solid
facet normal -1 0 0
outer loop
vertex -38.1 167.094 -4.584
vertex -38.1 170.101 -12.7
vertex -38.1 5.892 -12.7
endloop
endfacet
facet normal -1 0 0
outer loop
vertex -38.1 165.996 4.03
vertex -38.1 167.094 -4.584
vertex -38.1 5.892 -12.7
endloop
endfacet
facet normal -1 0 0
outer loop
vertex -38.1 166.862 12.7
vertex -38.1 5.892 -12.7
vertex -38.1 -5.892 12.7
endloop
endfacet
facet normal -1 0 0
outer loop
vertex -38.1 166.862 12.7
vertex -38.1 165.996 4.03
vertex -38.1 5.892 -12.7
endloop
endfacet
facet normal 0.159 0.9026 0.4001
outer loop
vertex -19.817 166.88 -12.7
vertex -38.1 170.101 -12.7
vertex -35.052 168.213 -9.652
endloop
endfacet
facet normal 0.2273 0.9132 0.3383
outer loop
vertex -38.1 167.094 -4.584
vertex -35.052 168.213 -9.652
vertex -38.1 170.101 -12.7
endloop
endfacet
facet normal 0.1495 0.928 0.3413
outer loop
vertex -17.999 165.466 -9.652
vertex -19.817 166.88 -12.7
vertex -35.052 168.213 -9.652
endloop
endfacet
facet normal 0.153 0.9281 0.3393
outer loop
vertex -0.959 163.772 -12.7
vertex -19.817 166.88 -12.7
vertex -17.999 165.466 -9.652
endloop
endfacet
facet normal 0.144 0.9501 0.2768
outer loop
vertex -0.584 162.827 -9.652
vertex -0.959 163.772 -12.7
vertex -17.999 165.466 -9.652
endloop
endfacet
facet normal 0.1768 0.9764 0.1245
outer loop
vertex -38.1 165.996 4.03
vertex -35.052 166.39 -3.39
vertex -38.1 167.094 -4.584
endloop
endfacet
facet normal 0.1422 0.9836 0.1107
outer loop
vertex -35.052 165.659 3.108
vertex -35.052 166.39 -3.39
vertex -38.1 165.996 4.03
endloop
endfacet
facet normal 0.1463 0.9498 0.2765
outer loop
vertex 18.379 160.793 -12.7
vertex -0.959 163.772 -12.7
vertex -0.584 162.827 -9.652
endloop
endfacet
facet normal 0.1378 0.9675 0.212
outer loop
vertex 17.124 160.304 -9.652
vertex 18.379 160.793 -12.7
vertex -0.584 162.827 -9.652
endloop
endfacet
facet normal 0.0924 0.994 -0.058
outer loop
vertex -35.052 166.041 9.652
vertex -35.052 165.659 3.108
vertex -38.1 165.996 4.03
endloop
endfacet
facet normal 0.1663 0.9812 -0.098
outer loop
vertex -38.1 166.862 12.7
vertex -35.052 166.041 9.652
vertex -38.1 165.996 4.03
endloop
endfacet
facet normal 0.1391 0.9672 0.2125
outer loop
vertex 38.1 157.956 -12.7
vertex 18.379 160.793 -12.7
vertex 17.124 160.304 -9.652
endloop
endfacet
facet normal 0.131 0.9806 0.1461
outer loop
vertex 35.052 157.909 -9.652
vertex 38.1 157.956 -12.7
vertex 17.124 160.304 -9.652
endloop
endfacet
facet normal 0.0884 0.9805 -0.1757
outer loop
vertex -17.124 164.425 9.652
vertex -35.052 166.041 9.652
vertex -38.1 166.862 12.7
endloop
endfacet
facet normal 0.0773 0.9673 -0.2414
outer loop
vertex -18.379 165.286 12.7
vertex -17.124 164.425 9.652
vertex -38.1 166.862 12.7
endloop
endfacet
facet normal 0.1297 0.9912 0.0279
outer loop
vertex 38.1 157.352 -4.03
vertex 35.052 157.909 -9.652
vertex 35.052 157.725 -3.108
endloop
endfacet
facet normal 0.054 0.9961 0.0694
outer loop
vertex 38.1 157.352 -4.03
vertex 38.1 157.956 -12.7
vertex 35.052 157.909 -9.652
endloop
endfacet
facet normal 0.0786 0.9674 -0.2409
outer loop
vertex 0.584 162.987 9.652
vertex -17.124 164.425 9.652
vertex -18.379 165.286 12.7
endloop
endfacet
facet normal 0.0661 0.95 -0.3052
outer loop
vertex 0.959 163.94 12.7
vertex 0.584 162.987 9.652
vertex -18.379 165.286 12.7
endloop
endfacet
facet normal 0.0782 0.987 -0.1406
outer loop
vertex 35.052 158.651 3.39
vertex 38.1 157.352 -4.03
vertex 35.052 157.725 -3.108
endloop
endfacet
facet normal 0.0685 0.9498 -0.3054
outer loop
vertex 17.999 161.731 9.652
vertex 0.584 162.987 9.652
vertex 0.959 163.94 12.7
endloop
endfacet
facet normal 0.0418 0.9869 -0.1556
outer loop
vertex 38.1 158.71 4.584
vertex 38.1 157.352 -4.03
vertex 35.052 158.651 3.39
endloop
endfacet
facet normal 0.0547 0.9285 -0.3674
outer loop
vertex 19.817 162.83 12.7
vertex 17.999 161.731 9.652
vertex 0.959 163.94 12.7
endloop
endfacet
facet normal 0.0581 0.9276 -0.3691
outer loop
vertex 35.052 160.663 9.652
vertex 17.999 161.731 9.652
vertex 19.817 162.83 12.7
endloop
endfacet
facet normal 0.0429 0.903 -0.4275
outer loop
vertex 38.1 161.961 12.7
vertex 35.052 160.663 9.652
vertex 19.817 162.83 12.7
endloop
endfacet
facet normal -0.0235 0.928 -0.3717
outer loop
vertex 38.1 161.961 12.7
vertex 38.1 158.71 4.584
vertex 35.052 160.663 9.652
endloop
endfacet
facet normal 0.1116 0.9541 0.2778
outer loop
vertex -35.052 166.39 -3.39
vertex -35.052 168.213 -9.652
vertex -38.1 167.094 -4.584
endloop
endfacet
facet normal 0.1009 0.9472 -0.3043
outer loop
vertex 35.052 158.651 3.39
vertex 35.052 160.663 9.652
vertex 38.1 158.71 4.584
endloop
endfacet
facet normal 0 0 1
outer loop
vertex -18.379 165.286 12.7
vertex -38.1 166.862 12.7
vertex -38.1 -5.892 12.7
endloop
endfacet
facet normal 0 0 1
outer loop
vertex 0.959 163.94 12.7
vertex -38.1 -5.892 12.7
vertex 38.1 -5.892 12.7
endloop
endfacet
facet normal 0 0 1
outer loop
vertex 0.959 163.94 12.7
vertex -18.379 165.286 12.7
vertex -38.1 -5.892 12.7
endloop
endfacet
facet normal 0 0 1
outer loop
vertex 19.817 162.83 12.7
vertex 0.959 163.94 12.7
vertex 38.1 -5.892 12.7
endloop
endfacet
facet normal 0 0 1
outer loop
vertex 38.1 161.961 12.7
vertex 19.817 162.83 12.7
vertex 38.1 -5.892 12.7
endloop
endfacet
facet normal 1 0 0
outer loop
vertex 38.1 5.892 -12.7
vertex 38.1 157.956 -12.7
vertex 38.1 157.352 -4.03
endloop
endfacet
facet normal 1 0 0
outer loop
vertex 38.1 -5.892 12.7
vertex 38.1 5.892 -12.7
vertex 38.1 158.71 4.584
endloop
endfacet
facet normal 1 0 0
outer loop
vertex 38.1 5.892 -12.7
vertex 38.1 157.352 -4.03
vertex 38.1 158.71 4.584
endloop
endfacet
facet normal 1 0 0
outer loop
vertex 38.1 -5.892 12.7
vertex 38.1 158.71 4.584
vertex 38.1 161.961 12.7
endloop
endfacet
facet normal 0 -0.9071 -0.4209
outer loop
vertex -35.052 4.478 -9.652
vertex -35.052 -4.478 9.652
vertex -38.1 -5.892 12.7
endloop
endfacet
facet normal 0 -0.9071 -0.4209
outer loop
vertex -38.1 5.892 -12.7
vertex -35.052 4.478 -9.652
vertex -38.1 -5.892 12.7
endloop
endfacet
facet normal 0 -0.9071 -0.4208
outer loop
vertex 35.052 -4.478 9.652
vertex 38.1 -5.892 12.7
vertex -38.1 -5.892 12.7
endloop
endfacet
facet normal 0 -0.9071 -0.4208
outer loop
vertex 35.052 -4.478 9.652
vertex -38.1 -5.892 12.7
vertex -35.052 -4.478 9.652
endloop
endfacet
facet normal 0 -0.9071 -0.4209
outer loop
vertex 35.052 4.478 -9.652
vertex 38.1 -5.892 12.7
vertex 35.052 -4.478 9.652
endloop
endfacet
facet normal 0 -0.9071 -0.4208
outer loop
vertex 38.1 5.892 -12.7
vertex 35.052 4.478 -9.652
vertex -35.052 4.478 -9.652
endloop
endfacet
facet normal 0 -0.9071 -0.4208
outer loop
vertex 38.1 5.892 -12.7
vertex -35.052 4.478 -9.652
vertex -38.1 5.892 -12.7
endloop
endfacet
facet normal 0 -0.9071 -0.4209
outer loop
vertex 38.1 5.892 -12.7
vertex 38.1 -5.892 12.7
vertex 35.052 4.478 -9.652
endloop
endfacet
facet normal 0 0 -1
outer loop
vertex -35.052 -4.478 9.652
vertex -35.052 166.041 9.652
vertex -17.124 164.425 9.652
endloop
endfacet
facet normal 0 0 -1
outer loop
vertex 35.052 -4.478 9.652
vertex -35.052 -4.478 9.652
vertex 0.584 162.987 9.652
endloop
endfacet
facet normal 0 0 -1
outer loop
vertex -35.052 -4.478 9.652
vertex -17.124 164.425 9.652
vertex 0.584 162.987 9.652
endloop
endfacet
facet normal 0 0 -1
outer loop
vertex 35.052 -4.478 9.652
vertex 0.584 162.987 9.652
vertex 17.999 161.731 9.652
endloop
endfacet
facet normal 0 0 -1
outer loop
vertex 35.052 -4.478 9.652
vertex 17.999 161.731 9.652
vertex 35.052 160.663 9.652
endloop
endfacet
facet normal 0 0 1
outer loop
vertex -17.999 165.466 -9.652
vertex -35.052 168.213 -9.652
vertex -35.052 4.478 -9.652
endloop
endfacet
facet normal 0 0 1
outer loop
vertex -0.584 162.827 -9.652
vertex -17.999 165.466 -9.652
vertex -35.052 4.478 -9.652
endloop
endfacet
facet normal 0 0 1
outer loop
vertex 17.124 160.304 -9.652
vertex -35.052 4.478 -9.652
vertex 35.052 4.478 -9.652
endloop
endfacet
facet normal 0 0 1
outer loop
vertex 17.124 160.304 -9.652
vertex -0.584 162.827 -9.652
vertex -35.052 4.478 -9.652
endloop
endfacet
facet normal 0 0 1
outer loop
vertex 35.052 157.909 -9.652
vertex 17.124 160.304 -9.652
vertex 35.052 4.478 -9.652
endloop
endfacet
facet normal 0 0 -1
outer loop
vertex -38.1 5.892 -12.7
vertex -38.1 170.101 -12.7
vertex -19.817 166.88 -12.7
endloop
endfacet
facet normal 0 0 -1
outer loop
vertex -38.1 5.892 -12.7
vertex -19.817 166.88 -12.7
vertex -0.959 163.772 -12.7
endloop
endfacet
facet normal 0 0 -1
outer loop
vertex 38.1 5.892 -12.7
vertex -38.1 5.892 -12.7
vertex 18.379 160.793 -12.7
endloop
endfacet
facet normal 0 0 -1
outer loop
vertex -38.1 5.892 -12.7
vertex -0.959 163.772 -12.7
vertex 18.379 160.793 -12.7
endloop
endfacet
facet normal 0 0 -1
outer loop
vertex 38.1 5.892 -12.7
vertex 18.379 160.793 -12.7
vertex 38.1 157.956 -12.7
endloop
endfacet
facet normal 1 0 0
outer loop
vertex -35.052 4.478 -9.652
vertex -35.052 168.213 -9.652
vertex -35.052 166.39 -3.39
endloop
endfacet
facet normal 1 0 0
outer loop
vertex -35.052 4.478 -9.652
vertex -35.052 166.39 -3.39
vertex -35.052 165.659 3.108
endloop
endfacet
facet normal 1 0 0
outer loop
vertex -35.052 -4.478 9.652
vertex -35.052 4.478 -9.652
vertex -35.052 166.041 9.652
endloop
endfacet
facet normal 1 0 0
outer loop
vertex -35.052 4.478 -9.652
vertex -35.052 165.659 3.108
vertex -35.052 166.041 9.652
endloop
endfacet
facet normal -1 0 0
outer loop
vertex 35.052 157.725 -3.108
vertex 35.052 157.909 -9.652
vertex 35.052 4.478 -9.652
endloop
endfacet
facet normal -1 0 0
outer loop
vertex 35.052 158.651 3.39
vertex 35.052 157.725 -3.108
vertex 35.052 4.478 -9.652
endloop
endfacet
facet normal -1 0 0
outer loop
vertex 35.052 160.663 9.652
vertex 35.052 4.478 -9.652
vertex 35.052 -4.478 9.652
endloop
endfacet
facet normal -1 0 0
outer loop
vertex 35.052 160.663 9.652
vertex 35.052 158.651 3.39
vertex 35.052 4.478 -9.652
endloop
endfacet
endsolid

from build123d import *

# Parameters (mm, degrees)
SKETCH1_W           = 76.2
SKETCH1_H           = 25.4
SKETCH1_W_2         = 70.104
SKETCH1_H_2         = 19.304
BOSS_EXTRUDE1_DEPTH = 200
SKETCH3_W           = 76.2
SKETCH3_H           = 25.4
SKETCH3_W_2         = 70.104
SKETCH3_H_2         = 19.304
BOSS_EXTRUDE2_DEPTH = 38.1
CUT_EXTRUDE1_DEPTH  = 77.2
CUT_EXTRUDE5_START  = 13.832764
SKETCH7_R           = 38.1
CUT_EXTRUDE5_DEPTH  = 83.124802


with BuildPart() as part:
    # Sketch1 → Boss-Extrude1 (new body)
    with BuildSketch(Plane(origin=(0, 0, 0), x_dir=(1, 0, 0), z_dir=(0, 1, 0))):
        Rectangle(SKETCH1_W, SKETCH1_H)
        Rectangle(SKETCH1_W_2, SKETCH1_H_2, mode=Mode.SUBTRACT)
    extrude(amount=BOSS_EXTRUDE1_DEPTH)

    # Sketch3 → Boss-Extrude2 (add)
    with BuildSketch(Plane.XZ):
        Rectangle(SKETCH3_W, SKETCH3_H)
        Rectangle(SKETCH3_W_2, SKETCH3_H_2, mode=Mode.SUBTRACT)
    extrude(amount=BOSS_EXTRUDE2_DEPTH)

    # Sketch4 → Cut-Extrude1 (cut, through all)
    with BuildSketch(Plane(origin=(38.1, 0, 0), x_dir=(0, 0, -1), z_dir=(1, 0, 0))):
        Polygon((-18.94463971, -8.788530579), (21.02313948, 9.752758934), (26.07322677, -49.294265894), (-15.918593218, -47.517542491), align=None)
    extrude(amount=-CUT_EXTRUDE1_DEPTH, mode=Mode.SUBTRACT)

    # Sketch7 → Cut-Extrude5 (cut)
    with BuildSketch(Plane(origin=(56.875227758, 193.523427606, -7.656864493), x_dir=(0.131571603, -0.016382038, 0.991171298), z_dir=(-0.984807753, 0.112143352, 0.132580384)).offset(CUT_EXTRUDE5_START)):
        Circle(SKETCH7_R)
    extrude(amount=CUT_EXTRUDE5_DEPTH, mode=Mode.SUBTRACT)


solid = part.part
